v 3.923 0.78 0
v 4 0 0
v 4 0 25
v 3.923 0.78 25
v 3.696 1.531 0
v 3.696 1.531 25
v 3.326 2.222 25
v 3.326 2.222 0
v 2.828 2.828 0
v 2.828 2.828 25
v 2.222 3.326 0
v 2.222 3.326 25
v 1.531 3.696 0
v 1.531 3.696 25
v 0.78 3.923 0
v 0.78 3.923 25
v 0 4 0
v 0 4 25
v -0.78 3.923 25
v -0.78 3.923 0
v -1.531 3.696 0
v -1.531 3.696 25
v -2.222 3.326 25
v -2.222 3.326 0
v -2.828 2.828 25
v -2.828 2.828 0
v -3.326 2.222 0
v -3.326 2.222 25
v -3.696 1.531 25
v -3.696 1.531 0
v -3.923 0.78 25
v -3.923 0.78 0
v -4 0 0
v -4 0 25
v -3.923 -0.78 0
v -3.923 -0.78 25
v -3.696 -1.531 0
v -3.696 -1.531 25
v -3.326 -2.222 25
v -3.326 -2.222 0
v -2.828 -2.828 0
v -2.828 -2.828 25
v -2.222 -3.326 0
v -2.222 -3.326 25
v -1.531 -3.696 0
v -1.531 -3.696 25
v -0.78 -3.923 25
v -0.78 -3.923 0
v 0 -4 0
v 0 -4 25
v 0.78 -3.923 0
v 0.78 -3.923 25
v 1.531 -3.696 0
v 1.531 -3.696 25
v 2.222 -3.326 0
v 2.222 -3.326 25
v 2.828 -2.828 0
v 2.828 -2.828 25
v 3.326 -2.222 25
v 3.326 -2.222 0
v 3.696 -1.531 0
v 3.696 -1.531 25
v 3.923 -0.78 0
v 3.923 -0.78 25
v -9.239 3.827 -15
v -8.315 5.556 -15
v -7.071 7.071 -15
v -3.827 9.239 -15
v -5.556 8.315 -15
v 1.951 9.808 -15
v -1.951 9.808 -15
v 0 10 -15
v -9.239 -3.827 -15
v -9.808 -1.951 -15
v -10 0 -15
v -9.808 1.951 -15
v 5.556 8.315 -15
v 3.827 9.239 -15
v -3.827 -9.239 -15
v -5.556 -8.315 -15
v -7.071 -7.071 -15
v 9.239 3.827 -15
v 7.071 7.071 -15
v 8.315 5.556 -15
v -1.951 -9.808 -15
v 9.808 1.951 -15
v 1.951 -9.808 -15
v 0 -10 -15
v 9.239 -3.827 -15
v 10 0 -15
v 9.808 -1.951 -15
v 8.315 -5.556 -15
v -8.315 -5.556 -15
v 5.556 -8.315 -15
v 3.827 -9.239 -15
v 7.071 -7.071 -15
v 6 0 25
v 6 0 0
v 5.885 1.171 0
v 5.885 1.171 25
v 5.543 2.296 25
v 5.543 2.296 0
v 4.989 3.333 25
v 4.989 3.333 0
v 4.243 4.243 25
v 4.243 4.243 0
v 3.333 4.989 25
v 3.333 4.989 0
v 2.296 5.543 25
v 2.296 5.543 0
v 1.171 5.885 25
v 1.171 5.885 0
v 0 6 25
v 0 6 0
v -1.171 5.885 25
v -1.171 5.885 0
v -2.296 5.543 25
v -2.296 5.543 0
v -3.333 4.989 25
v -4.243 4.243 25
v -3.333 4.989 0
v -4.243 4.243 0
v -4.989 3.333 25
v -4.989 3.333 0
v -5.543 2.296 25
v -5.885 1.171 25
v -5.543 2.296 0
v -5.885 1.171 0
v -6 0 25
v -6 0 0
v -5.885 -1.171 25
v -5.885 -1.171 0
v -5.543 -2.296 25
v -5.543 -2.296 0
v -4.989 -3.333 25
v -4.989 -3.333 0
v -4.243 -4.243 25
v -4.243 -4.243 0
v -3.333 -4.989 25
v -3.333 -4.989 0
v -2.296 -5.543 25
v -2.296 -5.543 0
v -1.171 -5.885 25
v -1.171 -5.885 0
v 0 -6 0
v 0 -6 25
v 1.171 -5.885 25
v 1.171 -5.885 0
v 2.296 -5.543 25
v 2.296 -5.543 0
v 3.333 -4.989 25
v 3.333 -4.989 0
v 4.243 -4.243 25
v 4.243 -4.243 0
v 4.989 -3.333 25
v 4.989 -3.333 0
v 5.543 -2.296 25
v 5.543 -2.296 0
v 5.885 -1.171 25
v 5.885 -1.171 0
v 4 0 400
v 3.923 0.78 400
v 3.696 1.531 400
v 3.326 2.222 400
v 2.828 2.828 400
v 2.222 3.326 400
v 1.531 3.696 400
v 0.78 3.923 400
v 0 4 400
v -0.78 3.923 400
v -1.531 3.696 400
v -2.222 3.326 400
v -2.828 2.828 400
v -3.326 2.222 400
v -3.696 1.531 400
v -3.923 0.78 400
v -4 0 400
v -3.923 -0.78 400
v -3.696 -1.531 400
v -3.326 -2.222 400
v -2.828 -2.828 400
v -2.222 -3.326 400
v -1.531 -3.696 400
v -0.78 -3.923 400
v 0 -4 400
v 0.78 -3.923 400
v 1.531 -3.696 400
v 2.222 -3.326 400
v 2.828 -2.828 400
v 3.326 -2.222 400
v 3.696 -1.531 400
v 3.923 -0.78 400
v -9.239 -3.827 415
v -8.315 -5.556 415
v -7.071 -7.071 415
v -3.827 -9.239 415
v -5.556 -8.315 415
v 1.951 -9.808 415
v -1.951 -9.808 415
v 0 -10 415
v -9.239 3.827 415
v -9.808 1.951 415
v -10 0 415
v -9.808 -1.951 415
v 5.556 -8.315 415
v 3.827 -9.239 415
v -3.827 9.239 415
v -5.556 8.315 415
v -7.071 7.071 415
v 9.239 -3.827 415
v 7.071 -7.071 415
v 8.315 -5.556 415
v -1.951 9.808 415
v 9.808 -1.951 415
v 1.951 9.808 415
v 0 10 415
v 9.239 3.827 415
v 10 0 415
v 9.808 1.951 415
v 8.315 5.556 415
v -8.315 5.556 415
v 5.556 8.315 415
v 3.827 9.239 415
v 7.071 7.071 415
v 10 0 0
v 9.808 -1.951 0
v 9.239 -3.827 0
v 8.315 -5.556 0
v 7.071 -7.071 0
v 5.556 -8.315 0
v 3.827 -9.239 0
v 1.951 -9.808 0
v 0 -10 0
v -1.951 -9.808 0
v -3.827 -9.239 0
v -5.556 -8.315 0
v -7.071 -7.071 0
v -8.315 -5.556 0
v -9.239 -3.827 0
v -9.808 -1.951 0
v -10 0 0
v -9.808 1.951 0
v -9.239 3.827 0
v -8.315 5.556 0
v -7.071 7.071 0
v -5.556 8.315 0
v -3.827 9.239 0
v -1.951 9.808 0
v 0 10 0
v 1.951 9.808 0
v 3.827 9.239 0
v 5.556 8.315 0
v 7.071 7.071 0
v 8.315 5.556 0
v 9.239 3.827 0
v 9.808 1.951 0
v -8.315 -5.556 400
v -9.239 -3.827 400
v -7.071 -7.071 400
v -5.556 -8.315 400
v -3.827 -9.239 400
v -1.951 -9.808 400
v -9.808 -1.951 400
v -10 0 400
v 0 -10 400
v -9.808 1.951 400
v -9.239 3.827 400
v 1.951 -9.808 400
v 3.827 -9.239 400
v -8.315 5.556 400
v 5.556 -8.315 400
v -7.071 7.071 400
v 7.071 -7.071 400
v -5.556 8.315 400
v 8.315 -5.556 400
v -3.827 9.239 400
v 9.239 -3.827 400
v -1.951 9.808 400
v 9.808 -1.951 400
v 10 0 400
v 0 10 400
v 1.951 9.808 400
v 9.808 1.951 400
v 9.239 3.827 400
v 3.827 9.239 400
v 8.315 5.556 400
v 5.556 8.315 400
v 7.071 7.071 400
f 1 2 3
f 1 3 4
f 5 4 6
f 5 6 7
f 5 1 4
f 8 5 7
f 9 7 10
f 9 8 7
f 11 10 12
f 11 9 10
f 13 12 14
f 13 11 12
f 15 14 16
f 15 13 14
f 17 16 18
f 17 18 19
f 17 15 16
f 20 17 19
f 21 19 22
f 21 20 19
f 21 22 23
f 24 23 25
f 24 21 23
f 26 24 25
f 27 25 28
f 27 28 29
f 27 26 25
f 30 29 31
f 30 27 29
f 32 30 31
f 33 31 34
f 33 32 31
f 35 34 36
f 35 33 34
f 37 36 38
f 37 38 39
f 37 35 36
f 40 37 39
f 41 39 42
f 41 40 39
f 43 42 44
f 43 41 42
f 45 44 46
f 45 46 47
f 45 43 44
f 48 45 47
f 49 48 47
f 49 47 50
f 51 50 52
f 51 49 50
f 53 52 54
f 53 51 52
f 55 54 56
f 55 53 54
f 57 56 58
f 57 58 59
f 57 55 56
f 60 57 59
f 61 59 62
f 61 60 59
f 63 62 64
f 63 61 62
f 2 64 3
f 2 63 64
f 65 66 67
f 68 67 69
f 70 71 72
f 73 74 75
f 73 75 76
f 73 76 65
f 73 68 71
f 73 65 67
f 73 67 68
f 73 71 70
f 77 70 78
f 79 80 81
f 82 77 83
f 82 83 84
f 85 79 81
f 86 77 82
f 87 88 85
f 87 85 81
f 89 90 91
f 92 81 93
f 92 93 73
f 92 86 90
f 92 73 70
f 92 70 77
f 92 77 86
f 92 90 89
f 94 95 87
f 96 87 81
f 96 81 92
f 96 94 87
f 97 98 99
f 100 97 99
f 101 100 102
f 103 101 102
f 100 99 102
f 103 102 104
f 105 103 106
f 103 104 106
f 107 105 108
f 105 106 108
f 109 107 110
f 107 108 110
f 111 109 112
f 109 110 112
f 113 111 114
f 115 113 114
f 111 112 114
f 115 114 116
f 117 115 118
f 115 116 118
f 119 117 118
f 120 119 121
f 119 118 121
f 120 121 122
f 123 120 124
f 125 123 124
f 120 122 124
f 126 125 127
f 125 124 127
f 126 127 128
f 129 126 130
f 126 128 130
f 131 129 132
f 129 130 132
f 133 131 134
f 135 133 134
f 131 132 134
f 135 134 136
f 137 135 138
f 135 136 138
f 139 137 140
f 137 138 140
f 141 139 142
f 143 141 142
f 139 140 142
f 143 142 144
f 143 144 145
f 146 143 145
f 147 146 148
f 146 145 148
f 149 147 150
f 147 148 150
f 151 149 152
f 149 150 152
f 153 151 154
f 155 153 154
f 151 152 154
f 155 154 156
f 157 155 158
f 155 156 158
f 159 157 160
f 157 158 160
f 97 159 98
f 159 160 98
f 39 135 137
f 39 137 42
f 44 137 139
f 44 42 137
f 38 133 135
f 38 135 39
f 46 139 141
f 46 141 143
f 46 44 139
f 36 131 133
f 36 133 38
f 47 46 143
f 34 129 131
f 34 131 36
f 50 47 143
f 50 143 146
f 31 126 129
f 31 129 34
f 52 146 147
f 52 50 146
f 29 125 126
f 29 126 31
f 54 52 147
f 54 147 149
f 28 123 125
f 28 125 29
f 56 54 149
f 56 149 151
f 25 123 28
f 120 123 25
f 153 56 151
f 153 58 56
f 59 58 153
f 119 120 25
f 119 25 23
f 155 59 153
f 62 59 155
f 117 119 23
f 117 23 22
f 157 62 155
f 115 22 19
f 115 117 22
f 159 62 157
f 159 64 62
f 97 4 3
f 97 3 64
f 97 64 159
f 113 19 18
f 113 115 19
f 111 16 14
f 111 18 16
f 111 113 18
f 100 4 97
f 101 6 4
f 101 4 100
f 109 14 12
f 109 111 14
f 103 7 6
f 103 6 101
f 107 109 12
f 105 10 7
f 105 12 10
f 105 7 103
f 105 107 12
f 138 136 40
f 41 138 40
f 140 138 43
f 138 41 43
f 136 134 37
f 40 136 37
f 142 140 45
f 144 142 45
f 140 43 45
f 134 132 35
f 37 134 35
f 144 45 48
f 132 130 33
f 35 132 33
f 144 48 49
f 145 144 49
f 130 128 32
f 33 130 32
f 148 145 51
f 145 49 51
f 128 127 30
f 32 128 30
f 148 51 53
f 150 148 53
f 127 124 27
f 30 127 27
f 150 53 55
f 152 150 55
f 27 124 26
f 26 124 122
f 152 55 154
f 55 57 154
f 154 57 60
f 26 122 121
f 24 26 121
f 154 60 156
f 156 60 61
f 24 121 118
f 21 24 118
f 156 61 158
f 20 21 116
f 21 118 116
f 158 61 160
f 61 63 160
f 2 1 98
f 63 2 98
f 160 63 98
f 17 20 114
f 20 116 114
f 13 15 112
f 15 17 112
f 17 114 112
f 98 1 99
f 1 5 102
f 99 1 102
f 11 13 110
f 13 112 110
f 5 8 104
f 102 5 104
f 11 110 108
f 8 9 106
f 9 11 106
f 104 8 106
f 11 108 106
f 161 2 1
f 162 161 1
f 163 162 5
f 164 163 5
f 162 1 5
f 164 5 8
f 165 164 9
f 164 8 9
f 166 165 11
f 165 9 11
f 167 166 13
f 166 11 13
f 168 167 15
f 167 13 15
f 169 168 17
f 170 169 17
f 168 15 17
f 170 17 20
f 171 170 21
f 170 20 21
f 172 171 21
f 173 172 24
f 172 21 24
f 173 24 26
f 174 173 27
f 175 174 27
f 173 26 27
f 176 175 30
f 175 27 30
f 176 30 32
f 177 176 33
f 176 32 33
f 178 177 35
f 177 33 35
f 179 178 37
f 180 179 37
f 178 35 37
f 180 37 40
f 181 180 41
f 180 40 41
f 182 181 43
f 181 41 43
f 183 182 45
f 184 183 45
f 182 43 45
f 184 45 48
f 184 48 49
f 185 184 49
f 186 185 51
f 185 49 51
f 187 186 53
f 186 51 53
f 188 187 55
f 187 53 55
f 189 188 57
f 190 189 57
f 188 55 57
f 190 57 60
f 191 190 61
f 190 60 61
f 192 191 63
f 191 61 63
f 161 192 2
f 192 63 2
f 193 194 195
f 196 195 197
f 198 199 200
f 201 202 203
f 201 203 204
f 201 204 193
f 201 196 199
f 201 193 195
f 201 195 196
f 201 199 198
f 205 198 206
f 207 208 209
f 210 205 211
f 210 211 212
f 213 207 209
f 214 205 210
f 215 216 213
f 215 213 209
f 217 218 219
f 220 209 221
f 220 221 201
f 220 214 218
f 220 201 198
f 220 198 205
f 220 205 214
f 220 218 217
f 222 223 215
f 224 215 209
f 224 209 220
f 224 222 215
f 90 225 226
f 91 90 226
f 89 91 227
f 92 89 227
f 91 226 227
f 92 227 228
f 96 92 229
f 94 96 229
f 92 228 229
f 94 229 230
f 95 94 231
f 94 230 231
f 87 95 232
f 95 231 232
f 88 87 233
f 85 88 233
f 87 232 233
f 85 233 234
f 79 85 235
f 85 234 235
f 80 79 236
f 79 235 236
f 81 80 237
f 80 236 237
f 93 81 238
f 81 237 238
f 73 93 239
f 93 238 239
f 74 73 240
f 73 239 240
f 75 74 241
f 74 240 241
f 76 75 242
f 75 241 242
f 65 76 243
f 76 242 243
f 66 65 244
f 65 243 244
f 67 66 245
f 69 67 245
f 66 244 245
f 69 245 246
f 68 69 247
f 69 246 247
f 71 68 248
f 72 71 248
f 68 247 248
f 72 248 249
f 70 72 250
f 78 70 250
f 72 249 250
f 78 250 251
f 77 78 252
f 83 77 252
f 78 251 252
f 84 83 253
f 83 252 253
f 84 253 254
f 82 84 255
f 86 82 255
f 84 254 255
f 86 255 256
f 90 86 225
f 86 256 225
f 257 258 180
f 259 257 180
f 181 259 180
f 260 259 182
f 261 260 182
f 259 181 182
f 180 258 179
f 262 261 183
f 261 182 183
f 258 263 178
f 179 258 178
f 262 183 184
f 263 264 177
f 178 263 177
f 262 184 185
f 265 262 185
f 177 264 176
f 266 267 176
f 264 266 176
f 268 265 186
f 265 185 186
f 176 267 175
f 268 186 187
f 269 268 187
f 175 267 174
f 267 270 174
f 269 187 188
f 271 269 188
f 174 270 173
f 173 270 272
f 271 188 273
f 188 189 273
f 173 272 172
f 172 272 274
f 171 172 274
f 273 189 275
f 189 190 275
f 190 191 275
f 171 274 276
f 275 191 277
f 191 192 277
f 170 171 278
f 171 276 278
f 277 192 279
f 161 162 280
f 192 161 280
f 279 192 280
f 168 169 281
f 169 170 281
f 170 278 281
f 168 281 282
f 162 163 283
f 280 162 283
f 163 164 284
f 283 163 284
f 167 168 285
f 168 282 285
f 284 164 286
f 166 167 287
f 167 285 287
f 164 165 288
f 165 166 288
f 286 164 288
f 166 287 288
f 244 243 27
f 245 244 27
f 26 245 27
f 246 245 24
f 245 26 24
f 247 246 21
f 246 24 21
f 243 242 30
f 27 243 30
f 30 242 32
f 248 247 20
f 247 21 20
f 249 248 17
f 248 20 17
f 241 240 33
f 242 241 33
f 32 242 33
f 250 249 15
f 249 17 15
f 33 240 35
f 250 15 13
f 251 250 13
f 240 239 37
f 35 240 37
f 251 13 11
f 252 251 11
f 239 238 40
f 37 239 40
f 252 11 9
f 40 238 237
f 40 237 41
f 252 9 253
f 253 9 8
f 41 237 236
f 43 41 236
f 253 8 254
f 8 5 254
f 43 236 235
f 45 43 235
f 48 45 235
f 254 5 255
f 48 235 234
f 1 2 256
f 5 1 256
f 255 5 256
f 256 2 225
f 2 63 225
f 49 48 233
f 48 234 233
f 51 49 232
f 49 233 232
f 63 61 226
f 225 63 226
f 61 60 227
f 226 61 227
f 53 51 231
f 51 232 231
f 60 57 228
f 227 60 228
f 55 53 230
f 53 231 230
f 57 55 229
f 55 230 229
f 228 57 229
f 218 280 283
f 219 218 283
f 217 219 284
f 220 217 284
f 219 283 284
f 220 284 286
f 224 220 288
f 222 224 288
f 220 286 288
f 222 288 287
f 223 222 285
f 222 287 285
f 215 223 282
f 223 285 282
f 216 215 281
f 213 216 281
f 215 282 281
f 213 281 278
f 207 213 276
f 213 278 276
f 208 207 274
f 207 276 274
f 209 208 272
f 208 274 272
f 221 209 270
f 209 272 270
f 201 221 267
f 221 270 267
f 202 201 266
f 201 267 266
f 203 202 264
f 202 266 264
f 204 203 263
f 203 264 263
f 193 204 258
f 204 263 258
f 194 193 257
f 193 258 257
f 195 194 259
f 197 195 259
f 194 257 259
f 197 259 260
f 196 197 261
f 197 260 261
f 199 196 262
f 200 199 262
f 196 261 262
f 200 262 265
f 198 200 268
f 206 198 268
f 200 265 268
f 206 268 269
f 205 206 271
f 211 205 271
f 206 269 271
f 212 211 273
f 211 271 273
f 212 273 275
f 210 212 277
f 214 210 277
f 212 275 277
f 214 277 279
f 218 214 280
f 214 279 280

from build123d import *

# Parameters (mm, degrees)
F0_R     = 6
F0_R_2   = 4
F1_DEPTH = 25
F2_R     = 4
F3_DEPTH = 400
F4_R     = 10
F5_DEPTH = 15
F6_R     = 10
F7_DEPTH = 15


with BuildPart() as f1:
    # F0 (on Top) → F1 (new body)
    with BuildSketch(Plane.XY):
        Circle(F0_R)
        Circle(F0_R_2, mode=Mode.SUBTRACT)
    extrude(amount=F1_DEPTH)


with BuildPart() as f3:
    # F2 (on Top) → F3 (new body)
    with BuildSketch(Plane.XY):
        Circle(F2_R)
    extrude(amount=F3_DEPTH)

    # F4 (on face) → F5 (join)
    with BuildSketch(Plane.XY.offset(400)):
        Circle(F4_R)
    extrude(amount=F5_DEPTH)

    # F6 (on face) → F7 (join)
    with BuildSketch(Plane(origin=(0, 0, 0), x_dir=(1, 0, 0), z_dir=(0, 0, -1))):
        Circle(F6_R)
    extrude(amount=F7_DEPTH)


solid = Compound([f1.part, f3.part])
